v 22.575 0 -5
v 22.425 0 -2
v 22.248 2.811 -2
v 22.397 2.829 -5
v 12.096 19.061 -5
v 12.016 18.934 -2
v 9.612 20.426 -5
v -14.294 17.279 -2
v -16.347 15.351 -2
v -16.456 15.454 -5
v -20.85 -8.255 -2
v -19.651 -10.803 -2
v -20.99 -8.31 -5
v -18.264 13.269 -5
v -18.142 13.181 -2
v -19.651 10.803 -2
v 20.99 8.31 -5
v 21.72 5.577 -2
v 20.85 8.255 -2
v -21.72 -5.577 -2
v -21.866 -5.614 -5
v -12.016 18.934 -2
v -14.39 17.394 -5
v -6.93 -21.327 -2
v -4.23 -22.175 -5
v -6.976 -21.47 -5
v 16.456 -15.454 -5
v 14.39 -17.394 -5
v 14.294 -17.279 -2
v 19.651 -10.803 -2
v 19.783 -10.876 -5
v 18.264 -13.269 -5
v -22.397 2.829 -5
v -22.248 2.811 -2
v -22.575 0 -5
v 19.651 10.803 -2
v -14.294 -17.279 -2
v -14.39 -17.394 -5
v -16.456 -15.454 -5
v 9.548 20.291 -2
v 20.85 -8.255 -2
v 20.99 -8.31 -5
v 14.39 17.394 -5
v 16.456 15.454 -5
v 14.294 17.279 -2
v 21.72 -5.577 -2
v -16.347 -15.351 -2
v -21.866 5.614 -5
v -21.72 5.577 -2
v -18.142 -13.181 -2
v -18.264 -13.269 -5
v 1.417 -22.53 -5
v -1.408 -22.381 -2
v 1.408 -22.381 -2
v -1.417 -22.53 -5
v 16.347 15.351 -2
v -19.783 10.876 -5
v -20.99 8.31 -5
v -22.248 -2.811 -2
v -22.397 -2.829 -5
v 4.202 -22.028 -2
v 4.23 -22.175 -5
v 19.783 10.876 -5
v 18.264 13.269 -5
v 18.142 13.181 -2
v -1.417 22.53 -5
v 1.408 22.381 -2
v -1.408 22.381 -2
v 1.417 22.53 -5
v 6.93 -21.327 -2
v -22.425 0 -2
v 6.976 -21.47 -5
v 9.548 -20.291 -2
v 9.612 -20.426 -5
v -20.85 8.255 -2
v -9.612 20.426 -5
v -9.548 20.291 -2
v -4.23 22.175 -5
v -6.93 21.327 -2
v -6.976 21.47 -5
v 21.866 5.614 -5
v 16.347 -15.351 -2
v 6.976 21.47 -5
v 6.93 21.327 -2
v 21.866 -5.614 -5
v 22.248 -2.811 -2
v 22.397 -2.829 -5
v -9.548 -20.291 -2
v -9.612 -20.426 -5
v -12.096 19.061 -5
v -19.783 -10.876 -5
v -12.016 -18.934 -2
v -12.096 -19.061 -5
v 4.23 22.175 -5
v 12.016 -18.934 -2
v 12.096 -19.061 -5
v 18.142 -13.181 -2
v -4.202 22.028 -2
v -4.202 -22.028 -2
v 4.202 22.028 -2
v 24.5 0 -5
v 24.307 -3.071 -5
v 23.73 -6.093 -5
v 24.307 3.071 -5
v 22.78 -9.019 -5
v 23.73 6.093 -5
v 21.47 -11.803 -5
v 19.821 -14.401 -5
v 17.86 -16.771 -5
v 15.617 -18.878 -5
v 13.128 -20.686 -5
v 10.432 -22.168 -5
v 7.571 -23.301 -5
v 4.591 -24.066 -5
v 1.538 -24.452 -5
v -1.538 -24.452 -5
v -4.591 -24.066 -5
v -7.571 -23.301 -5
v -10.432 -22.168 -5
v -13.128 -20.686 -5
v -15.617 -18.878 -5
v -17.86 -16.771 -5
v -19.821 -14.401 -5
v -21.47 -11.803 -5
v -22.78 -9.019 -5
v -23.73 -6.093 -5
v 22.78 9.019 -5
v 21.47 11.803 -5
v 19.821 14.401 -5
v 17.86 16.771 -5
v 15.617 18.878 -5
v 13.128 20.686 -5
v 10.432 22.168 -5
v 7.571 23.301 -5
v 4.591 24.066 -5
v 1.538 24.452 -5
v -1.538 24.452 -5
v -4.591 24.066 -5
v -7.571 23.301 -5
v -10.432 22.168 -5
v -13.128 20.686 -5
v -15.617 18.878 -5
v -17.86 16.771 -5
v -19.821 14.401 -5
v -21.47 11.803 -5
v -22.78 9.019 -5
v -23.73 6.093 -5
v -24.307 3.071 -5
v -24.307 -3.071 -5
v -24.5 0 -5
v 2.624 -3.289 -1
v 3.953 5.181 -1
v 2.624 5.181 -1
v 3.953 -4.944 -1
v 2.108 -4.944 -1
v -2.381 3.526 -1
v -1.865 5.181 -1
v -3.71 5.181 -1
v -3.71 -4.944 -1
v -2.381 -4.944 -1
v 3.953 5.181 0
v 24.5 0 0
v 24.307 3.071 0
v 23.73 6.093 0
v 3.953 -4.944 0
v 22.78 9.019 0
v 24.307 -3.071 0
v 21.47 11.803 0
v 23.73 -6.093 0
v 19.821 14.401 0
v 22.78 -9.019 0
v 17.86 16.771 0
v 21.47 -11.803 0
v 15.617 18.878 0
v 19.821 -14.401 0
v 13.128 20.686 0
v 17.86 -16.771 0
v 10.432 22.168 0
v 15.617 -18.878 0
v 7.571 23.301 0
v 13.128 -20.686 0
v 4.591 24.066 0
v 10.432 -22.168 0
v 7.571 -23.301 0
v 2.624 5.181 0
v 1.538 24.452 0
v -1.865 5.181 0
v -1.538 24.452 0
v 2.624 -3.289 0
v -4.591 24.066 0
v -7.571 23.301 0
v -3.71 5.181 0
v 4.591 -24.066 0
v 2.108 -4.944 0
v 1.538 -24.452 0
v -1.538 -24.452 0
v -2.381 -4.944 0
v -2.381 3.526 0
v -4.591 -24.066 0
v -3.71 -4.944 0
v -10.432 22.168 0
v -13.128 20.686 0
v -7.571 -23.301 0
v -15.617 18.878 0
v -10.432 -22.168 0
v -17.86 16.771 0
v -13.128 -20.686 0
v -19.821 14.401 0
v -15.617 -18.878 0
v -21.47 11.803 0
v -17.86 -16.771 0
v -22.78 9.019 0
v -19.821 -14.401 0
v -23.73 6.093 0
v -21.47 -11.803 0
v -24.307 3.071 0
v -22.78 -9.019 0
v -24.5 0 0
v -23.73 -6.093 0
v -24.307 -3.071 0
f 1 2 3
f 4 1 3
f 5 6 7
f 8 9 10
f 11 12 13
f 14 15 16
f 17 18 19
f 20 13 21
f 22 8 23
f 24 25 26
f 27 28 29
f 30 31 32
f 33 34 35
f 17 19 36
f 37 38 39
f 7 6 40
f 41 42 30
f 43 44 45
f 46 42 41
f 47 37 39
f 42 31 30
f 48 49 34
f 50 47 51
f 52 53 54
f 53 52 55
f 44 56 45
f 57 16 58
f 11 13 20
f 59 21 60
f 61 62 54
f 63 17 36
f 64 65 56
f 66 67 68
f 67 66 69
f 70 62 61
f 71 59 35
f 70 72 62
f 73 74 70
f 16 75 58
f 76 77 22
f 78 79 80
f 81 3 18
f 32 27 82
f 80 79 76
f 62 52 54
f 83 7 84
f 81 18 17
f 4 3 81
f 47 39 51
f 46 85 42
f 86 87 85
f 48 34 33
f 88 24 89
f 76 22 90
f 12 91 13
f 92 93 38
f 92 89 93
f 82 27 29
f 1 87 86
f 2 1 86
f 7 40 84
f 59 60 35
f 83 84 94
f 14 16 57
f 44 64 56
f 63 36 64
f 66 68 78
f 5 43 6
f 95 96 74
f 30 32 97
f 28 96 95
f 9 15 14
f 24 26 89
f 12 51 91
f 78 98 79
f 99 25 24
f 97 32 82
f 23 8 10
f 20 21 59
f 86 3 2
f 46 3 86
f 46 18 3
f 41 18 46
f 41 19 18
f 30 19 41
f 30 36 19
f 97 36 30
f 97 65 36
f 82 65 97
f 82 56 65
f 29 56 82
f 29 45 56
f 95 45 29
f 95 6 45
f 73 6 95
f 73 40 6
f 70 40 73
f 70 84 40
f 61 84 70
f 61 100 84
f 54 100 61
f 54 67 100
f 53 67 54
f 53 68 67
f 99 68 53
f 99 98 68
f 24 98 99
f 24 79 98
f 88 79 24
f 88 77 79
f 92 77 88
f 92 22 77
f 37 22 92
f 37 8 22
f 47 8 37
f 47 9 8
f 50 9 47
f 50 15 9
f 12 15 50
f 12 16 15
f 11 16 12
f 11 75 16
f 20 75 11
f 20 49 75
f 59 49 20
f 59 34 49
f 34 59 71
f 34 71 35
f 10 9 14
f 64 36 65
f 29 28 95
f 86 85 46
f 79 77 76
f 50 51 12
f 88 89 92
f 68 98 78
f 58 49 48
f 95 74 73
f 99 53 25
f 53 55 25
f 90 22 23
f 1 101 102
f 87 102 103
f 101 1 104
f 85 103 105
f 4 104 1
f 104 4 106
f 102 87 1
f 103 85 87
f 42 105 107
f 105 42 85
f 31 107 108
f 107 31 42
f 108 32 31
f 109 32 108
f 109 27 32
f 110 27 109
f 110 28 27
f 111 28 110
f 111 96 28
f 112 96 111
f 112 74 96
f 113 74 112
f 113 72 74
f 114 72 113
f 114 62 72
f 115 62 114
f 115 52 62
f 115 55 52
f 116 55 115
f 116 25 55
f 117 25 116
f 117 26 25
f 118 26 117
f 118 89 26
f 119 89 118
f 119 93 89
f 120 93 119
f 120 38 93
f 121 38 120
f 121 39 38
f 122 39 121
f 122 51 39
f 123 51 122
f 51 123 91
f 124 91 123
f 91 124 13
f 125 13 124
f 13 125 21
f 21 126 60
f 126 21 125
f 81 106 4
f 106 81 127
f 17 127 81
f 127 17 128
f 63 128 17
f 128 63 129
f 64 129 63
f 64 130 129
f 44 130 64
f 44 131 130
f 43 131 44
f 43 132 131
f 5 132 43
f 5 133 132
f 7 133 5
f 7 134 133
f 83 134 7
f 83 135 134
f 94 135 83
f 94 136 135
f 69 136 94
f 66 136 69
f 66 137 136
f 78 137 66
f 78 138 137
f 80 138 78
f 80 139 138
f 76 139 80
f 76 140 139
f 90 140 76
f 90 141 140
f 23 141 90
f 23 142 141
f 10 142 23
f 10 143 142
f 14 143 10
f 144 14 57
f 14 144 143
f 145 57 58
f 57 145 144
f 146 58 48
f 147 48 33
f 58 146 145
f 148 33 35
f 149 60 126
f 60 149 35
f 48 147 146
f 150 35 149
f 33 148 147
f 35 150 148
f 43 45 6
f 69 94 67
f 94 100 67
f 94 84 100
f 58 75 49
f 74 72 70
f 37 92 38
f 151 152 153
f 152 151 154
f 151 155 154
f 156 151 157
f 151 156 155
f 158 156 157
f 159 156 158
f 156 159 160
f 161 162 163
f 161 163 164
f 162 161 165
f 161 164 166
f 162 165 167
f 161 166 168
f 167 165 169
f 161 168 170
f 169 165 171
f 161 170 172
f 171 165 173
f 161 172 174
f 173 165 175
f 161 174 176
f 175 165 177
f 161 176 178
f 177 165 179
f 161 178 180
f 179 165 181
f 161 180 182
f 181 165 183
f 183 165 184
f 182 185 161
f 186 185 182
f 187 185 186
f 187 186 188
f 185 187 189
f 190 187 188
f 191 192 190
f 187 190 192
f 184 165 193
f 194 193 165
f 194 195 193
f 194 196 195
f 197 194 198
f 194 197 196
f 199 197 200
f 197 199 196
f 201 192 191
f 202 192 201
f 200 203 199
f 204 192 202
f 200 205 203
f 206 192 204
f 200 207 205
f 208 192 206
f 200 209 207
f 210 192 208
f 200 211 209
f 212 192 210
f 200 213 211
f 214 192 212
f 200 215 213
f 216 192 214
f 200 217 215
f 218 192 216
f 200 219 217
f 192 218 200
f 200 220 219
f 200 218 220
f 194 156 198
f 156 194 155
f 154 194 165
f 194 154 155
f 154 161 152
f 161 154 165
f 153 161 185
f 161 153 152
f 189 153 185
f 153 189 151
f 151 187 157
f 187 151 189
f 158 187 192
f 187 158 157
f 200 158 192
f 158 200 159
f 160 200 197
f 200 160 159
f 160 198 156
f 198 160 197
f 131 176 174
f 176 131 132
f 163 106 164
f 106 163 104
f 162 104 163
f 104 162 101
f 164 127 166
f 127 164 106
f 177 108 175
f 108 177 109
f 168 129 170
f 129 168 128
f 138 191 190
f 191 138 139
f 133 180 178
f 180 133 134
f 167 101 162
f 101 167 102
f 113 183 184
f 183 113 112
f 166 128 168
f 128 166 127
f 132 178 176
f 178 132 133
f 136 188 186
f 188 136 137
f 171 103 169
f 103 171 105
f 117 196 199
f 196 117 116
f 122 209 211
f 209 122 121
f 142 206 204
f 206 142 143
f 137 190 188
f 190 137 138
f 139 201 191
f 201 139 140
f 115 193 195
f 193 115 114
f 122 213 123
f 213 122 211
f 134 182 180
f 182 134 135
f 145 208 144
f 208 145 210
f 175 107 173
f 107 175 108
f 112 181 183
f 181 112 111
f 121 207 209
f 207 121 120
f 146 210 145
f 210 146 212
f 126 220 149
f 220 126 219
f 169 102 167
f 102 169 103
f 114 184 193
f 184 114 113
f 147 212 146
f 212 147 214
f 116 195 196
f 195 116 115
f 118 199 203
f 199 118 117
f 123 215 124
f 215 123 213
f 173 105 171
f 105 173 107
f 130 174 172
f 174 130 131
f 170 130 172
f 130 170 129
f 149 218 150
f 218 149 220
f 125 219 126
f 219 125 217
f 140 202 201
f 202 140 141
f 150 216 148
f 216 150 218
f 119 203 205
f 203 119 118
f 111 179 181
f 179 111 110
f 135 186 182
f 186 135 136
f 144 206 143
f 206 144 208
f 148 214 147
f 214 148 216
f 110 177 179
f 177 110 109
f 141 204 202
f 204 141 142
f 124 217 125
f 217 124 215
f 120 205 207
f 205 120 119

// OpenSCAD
$fn = 50;

difference() {
	union() {
		translate(v = [0, 0, -5.0]) {
			cylinder(h = 5, r = 24.5);
		}
	}
	union() {
		#translate(v = [0, 0, -5.0]) {
			cylinder(h = 3, r1 = 22.575, r2 = 22.425);
		}
		translate(v = [0, 0, -1]) {
			linear_extrude(height = 1) {
				text(font = "Impact", halign = "center", size = 10, text = "N", valign = "center");
			}
		}
	}
}
